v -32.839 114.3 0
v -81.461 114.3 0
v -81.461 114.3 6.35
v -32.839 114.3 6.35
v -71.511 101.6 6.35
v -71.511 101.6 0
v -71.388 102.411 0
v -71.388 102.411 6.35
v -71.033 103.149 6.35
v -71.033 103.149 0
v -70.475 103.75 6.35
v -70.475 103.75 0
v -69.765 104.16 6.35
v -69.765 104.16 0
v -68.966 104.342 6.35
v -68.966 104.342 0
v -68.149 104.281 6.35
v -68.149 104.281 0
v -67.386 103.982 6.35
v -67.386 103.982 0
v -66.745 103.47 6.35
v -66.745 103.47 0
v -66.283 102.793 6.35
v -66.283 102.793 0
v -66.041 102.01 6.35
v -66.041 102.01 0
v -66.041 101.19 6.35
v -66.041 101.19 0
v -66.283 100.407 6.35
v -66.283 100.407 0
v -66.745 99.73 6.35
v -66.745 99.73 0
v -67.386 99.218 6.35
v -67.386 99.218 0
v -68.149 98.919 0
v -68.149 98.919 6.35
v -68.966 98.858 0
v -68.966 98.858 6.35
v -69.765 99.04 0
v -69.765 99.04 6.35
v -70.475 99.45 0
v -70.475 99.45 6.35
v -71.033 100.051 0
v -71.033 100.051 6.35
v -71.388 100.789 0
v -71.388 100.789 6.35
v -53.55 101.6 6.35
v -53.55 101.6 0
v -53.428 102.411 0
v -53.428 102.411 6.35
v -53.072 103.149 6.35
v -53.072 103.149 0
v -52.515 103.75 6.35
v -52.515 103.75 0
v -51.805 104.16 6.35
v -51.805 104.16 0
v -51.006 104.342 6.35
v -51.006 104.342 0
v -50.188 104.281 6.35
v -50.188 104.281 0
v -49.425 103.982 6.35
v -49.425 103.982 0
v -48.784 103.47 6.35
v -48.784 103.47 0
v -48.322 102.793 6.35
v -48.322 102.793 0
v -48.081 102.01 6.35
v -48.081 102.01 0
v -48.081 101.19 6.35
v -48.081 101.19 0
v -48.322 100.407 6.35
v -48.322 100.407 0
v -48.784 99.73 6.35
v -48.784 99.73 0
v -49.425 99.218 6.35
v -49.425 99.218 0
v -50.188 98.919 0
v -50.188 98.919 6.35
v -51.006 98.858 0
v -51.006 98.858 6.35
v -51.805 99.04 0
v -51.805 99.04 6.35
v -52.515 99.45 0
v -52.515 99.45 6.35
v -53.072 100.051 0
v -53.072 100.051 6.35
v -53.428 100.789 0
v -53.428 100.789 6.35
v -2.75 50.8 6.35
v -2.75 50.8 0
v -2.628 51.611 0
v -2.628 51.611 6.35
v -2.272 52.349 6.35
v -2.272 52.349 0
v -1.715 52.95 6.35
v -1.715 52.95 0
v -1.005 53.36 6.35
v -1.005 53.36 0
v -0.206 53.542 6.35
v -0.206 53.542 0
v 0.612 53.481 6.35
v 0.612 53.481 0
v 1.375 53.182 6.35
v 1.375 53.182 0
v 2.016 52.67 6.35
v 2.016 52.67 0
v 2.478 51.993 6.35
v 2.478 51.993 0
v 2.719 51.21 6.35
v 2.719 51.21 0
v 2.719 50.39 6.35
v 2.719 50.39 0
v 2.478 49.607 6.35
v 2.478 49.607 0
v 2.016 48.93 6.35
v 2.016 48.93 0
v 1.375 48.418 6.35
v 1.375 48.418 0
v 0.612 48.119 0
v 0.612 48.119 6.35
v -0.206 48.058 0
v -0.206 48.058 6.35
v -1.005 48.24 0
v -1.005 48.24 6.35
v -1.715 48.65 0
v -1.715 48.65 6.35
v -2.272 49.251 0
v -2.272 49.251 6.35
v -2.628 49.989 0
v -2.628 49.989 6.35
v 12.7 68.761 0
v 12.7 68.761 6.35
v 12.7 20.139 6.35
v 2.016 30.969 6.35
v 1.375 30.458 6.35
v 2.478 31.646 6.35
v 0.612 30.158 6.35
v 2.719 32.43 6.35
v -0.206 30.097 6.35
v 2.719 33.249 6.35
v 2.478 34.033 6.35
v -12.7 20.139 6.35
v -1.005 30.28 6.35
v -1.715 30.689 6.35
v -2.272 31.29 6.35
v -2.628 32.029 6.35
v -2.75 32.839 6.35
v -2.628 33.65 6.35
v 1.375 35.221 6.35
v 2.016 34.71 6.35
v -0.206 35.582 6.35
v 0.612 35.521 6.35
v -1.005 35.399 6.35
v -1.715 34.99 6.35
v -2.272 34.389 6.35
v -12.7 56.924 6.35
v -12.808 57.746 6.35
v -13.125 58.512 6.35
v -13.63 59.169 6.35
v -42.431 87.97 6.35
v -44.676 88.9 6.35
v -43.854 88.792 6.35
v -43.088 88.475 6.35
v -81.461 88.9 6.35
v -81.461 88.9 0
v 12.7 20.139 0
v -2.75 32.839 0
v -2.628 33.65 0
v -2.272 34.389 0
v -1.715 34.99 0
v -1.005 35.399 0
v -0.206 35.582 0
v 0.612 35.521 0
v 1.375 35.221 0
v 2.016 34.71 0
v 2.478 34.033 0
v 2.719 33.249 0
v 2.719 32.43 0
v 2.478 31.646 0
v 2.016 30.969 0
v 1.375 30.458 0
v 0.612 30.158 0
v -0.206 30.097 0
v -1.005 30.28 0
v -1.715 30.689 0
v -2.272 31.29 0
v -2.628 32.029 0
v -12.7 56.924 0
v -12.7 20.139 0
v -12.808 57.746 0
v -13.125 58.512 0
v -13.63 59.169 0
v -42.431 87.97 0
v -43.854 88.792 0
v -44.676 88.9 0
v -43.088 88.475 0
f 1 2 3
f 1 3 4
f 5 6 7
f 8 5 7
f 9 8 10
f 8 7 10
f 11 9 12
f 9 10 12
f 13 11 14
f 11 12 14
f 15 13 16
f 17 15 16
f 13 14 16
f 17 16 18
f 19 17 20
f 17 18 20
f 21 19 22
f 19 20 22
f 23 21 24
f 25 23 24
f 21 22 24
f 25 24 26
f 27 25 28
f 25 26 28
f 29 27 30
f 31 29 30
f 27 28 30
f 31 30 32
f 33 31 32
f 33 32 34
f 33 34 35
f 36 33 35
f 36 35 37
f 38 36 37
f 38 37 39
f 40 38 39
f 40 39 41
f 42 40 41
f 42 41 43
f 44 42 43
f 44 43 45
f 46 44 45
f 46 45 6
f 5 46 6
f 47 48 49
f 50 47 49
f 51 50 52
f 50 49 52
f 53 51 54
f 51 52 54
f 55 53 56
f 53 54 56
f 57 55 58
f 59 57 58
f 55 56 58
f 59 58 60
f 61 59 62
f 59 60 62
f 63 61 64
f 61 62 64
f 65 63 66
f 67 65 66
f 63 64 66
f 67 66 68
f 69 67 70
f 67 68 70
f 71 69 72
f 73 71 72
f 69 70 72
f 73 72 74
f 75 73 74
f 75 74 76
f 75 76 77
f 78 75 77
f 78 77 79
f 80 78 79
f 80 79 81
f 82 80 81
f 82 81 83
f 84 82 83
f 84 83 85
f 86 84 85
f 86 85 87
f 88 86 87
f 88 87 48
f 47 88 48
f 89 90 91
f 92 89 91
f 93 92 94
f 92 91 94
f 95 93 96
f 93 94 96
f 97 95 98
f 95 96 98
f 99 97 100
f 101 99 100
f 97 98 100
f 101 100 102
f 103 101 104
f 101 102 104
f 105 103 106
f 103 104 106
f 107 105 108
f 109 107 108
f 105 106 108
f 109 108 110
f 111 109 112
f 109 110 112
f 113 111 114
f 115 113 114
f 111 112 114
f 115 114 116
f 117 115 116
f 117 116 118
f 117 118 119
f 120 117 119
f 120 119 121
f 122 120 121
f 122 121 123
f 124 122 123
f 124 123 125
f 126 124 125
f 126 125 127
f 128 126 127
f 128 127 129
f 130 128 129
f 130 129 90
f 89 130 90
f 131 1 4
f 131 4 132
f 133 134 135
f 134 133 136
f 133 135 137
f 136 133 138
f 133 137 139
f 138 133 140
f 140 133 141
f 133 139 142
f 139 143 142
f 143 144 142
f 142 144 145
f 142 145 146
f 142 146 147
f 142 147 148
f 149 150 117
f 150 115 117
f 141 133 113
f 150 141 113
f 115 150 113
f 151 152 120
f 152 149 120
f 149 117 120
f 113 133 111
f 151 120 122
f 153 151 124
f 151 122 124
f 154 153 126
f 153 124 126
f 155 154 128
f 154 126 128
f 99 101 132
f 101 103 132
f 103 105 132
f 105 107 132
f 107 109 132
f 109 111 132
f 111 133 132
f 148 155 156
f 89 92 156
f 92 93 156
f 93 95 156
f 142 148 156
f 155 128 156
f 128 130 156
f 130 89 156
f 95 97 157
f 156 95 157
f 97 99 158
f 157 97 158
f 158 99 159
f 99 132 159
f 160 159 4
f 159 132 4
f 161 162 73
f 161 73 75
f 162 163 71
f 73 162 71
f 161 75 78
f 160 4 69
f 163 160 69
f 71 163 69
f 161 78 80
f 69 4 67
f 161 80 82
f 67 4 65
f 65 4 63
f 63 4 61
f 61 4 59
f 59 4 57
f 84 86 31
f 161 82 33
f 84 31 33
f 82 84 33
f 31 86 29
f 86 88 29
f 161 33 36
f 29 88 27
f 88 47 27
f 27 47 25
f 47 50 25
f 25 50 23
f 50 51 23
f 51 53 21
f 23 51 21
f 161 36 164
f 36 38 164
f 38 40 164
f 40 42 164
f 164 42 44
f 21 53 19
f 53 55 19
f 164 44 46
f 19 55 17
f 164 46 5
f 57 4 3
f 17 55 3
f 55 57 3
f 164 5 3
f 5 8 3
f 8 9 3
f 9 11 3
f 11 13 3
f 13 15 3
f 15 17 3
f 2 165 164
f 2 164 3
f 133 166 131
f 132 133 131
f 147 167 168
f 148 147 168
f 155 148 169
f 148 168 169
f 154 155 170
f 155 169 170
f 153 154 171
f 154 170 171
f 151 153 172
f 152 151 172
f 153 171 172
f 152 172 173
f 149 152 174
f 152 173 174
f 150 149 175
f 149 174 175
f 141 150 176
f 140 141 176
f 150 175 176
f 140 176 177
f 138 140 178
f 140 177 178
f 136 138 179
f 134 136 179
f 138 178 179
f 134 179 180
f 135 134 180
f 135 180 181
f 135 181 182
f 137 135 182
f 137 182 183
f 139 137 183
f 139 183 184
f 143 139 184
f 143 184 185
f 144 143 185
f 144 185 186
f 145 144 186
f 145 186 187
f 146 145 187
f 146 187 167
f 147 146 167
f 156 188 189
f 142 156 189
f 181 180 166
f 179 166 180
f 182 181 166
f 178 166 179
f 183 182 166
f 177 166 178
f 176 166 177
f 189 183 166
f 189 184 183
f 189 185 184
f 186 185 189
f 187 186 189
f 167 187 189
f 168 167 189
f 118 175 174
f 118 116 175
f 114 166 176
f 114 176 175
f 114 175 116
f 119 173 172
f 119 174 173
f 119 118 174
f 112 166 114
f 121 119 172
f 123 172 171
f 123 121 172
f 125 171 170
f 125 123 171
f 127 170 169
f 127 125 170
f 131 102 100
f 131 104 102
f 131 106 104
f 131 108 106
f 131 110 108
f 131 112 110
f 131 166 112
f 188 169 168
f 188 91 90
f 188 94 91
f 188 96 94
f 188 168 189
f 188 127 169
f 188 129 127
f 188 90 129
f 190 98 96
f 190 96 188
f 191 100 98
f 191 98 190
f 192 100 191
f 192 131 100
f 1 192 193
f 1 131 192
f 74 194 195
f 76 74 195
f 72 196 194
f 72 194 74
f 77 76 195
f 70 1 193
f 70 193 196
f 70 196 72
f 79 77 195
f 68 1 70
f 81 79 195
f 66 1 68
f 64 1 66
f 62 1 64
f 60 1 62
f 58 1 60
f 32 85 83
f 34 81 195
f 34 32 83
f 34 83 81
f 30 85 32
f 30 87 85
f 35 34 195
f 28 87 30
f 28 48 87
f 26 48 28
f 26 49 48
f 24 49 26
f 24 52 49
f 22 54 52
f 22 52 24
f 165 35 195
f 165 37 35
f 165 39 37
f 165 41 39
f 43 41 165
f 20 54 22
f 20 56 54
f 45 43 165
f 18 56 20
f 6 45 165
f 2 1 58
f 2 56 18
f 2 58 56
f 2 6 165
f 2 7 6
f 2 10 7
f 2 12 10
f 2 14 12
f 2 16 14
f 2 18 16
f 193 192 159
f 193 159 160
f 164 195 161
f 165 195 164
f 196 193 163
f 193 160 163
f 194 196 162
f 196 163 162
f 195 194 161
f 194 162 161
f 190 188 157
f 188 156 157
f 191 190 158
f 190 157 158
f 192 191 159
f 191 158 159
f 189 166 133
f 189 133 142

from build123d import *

# Parameters (mm, degrees)
BOSS_EXTRUDE1_DEPTH      = 6.35
FILLET1_R                = 3.175
M5_CLEARANCE_HOLE1_D     = 5.5
M5_CLEARANCE_HOLE1_DEPTH = 18.75
M5_CLEARANCE_HOLE1_TIP   = 1.652366702


with BuildPart() as part:
    # Sketch1 → Boss-Extrude1 (new body)
    with BuildSketch(Plane.XY):
        Polygon((-12.7, 29.029487758), (-12.7, 58.239487758), (-43.360512242, 88.9), (-81.460512242, 88.9), (-81.460512242, 114.3), (-32.839487758, 114.3), (12.7, 68.760512242), (12.7, 37.919487758), (12.7, 29.029487758), (12.7, 20.139487758), (-12.7, 20.139487758), align=None)
    extrude(amount=BOSS_EXTRUDE1_DEPTH)

    # Fillet1
    fillet1_edges = [part.edges().sort_by_distance(p)[0] for p in [
        (-12.7, 58.239487758, 3.175),
        (-43.360512242, 88.9, 3.175),
    ]]
    fillet(fillet1_edges, radius=FILLET1_R)

    # M5 Clearance Hole1
    with Locations(Plane.XY.offset(6.35)):
        with Locations((0, 50.8), (-50.8, 101.6), (-68.760512242, 101.6), (0, 32.839487758)):
            Hole(M5_CLEARANCE_HOLE1_D / 2, depth=M5_CLEARANCE_HOLE1_DEPTH)
            with Locations((0, 0, -(M5_CLEARANCE_HOLE1_DEPTH + M5_CLEARANCE_HOLE1_TIP / 2))):  # 118° drill point
                Cone(0, M5_CLEARANCE_HOLE1_D / 2, M5_CLEARANCE_HOLE1_TIP, mode=Mode.SUBTRACT)


solid = part.part
